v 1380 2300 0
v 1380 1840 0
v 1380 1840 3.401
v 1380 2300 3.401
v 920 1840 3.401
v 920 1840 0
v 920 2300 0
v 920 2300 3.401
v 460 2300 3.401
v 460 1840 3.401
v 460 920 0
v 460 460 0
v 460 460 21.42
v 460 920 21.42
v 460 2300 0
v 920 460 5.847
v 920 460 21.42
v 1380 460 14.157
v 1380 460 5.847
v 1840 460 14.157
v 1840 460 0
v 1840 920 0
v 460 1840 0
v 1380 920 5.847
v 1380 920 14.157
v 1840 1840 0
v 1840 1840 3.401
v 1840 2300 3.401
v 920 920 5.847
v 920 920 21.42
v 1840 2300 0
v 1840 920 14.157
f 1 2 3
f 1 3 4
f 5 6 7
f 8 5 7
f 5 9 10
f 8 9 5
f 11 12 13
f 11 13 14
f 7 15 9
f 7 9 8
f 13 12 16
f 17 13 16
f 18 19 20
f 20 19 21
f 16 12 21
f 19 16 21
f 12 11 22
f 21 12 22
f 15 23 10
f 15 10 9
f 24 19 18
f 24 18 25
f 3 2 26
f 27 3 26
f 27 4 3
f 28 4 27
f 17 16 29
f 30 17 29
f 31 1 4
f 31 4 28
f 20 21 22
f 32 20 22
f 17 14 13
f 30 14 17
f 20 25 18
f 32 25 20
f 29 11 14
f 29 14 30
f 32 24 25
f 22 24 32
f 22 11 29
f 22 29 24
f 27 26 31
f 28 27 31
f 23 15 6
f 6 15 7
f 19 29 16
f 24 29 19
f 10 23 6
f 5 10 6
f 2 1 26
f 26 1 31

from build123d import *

# Parameters (mm, degrees)
SKETCH_1_W      = 460
SKETCH_1_H      = 460
EXTRUDE_1_DEPTH = 21.4200203
SKETCH_2_W      = 460
SKETCH_2_H      = 460
EXTRUDE_2_DEPTH = 5.8470921
SKETCH_3_W      = 460
SKETCH_3_H      = 460
EXTRUDE_3_DEPTH = 14.156868
SKETCH_13_W     = 460
SKETCH_13_H     = 460
EXTRUDE_4_DEPTH = 3.4007521
SKETCH_15_W     = 460
SKETCH_15_H     = 460
EXTRUDE_5_DEPTH = 3.4007521


with BuildPart() as part:
    # 草图1 → 凸台-拉伸1 (new body)
    with BuildSketch(Plane.XY):
        with Locations((690, 690)):
            Rectangle(SKETCH_1_W, SKETCH_1_H)
    extrude(amount=EXTRUDE_1_DEPTH)

    # 草图2 → 凸台-拉伸2 (add)
    with BuildSketch(Plane.XY):
        with Locations((1150, 690)):
            Rectangle(SKETCH_2_W, SKETCH_2_H)
    extrude(amount=EXTRUDE_2_DEPTH)

    # 草图3 → 凸台-拉伸3 (add)
    with BuildSketch(Plane.XY):
        with Locations((1610, 690)):
            Rectangle(SKETCH_3_W, SKETCH_3_H)
    extrude(amount=EXTRUDE_3_DEPTH)


with BuildPart() as body_2:
    # 草图13 → 凸台-拉伸4 (new body)
    with BuildSketch(Plane.XY):
        with Locations((690, 2070)):
            Rectangle(SKETCH_13_W, SKETCH_13_H)
    extrude(amount=EXTRUDE_4_DEPTH)


with BuildPart() as body_3:
    # 草图15 → 凸台-拉伸5 (new body)
    with BuildSketch(Plane.XY):
        with Locations((1610, 2070)):
            Rectangle(SKETCH_15_W, SKETCH_15_H)
    extrude(amount=EXTRUDE_5_DEPTH)


solid = Compound([part.part, body_2.part, body_3.part])
